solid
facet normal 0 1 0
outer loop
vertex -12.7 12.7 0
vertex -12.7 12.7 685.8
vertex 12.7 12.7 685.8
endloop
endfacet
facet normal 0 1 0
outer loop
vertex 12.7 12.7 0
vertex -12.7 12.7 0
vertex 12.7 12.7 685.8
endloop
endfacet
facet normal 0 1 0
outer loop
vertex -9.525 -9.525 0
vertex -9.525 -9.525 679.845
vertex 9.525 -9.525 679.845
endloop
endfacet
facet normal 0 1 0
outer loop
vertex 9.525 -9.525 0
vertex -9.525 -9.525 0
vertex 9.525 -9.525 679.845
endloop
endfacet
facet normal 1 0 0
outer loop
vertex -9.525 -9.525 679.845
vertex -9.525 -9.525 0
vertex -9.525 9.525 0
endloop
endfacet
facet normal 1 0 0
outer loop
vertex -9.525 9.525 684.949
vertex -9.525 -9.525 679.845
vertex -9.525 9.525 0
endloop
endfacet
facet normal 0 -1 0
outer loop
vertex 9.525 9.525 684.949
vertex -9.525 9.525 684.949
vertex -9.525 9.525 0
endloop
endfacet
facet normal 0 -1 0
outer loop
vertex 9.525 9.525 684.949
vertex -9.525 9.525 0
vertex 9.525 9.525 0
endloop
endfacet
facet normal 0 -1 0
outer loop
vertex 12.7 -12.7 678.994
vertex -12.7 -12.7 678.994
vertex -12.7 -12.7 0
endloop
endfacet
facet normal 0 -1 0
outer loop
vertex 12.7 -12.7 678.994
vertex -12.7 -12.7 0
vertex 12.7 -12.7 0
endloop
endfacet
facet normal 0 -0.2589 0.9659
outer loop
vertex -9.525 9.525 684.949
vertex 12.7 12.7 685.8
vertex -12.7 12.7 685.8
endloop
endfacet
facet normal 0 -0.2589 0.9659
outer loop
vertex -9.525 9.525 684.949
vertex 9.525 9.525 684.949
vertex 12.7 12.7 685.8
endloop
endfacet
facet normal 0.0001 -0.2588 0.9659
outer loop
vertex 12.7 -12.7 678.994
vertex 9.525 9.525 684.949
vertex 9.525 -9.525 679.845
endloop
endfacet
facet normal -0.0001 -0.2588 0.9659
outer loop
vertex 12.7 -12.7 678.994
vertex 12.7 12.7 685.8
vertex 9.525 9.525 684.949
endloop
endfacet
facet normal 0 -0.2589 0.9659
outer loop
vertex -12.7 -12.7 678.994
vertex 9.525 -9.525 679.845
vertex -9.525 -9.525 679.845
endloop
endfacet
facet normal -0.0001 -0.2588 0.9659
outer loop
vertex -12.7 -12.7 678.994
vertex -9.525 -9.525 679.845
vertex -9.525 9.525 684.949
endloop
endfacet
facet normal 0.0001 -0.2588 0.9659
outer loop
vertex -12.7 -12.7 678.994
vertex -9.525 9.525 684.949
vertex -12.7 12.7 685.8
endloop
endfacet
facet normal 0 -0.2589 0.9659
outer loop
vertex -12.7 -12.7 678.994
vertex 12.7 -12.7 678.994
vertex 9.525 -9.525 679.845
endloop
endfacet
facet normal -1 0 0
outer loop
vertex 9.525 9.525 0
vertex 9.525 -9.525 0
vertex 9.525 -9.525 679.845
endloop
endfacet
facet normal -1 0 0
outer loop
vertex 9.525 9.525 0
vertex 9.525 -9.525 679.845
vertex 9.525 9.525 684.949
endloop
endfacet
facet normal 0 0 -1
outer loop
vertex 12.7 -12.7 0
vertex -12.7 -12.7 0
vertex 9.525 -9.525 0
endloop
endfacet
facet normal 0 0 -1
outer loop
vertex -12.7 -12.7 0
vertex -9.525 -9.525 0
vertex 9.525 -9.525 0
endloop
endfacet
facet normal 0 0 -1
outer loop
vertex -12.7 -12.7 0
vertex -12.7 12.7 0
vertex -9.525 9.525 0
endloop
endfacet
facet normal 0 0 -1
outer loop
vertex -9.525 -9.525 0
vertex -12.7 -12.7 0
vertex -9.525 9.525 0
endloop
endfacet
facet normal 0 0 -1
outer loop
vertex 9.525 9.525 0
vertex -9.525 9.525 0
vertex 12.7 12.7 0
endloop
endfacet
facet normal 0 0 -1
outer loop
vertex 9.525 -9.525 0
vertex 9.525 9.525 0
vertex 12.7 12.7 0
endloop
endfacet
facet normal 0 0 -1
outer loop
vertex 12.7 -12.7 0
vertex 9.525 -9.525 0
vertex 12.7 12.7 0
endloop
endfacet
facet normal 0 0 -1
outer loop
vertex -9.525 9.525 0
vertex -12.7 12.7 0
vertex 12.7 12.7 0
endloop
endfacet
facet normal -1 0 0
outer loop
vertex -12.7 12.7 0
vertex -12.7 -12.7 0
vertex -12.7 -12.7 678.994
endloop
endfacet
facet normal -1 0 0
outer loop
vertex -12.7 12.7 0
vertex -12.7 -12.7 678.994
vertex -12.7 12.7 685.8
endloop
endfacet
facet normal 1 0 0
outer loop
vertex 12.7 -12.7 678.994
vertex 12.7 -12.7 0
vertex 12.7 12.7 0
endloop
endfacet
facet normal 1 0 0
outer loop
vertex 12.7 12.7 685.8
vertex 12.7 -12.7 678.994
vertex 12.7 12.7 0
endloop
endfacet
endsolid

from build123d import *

# Parameters (mm, degrees)
SKETCH1_W           = 25.4
SKETCH1_H           = 25.4
SKETCH1_W_2         = 19.05
SKETCH1_H_2         = 19.05
BOSS_EXTRUDE1_DEPTH = 685.8
SKETCH3_W           = 25.4
SKETCH3_H           = 26.296014982
CUT_EXTRUDE2_DEPTH  = 663.667216417


with BuildPart() as part:
    # Sketch1 → Boss-Extrude1 (new body)
    with BuildSketch(Plane.XY):
        Rectangle(SKETCH1_W, SKETCH1_H)
        Rectangle(SKETCH1_W_2, SKETCH1_H_2, mode=Mode.SUBTRACT)
    extrude(amount=BOSS_EXTRUDE1_DEPTH)

    # Sketch3 → Cut-Extrude2 (cut, through all)
    with BuildSketch(Plane(origin=(0, -170.599261314, 636.685110958), x_dir=(-1, 0, 0), z_dir=(0, -0.25881904510250786, 0.9659258262890718))):
        with Locations((0, -176.617351634)):
            Rectangle(SKETCH3_W, SKETCH3_H)
    extrude(amount=CUT_EXTRUDE2_DEPTH, mode=Mode.SUBTRACT)


solid = part.part
